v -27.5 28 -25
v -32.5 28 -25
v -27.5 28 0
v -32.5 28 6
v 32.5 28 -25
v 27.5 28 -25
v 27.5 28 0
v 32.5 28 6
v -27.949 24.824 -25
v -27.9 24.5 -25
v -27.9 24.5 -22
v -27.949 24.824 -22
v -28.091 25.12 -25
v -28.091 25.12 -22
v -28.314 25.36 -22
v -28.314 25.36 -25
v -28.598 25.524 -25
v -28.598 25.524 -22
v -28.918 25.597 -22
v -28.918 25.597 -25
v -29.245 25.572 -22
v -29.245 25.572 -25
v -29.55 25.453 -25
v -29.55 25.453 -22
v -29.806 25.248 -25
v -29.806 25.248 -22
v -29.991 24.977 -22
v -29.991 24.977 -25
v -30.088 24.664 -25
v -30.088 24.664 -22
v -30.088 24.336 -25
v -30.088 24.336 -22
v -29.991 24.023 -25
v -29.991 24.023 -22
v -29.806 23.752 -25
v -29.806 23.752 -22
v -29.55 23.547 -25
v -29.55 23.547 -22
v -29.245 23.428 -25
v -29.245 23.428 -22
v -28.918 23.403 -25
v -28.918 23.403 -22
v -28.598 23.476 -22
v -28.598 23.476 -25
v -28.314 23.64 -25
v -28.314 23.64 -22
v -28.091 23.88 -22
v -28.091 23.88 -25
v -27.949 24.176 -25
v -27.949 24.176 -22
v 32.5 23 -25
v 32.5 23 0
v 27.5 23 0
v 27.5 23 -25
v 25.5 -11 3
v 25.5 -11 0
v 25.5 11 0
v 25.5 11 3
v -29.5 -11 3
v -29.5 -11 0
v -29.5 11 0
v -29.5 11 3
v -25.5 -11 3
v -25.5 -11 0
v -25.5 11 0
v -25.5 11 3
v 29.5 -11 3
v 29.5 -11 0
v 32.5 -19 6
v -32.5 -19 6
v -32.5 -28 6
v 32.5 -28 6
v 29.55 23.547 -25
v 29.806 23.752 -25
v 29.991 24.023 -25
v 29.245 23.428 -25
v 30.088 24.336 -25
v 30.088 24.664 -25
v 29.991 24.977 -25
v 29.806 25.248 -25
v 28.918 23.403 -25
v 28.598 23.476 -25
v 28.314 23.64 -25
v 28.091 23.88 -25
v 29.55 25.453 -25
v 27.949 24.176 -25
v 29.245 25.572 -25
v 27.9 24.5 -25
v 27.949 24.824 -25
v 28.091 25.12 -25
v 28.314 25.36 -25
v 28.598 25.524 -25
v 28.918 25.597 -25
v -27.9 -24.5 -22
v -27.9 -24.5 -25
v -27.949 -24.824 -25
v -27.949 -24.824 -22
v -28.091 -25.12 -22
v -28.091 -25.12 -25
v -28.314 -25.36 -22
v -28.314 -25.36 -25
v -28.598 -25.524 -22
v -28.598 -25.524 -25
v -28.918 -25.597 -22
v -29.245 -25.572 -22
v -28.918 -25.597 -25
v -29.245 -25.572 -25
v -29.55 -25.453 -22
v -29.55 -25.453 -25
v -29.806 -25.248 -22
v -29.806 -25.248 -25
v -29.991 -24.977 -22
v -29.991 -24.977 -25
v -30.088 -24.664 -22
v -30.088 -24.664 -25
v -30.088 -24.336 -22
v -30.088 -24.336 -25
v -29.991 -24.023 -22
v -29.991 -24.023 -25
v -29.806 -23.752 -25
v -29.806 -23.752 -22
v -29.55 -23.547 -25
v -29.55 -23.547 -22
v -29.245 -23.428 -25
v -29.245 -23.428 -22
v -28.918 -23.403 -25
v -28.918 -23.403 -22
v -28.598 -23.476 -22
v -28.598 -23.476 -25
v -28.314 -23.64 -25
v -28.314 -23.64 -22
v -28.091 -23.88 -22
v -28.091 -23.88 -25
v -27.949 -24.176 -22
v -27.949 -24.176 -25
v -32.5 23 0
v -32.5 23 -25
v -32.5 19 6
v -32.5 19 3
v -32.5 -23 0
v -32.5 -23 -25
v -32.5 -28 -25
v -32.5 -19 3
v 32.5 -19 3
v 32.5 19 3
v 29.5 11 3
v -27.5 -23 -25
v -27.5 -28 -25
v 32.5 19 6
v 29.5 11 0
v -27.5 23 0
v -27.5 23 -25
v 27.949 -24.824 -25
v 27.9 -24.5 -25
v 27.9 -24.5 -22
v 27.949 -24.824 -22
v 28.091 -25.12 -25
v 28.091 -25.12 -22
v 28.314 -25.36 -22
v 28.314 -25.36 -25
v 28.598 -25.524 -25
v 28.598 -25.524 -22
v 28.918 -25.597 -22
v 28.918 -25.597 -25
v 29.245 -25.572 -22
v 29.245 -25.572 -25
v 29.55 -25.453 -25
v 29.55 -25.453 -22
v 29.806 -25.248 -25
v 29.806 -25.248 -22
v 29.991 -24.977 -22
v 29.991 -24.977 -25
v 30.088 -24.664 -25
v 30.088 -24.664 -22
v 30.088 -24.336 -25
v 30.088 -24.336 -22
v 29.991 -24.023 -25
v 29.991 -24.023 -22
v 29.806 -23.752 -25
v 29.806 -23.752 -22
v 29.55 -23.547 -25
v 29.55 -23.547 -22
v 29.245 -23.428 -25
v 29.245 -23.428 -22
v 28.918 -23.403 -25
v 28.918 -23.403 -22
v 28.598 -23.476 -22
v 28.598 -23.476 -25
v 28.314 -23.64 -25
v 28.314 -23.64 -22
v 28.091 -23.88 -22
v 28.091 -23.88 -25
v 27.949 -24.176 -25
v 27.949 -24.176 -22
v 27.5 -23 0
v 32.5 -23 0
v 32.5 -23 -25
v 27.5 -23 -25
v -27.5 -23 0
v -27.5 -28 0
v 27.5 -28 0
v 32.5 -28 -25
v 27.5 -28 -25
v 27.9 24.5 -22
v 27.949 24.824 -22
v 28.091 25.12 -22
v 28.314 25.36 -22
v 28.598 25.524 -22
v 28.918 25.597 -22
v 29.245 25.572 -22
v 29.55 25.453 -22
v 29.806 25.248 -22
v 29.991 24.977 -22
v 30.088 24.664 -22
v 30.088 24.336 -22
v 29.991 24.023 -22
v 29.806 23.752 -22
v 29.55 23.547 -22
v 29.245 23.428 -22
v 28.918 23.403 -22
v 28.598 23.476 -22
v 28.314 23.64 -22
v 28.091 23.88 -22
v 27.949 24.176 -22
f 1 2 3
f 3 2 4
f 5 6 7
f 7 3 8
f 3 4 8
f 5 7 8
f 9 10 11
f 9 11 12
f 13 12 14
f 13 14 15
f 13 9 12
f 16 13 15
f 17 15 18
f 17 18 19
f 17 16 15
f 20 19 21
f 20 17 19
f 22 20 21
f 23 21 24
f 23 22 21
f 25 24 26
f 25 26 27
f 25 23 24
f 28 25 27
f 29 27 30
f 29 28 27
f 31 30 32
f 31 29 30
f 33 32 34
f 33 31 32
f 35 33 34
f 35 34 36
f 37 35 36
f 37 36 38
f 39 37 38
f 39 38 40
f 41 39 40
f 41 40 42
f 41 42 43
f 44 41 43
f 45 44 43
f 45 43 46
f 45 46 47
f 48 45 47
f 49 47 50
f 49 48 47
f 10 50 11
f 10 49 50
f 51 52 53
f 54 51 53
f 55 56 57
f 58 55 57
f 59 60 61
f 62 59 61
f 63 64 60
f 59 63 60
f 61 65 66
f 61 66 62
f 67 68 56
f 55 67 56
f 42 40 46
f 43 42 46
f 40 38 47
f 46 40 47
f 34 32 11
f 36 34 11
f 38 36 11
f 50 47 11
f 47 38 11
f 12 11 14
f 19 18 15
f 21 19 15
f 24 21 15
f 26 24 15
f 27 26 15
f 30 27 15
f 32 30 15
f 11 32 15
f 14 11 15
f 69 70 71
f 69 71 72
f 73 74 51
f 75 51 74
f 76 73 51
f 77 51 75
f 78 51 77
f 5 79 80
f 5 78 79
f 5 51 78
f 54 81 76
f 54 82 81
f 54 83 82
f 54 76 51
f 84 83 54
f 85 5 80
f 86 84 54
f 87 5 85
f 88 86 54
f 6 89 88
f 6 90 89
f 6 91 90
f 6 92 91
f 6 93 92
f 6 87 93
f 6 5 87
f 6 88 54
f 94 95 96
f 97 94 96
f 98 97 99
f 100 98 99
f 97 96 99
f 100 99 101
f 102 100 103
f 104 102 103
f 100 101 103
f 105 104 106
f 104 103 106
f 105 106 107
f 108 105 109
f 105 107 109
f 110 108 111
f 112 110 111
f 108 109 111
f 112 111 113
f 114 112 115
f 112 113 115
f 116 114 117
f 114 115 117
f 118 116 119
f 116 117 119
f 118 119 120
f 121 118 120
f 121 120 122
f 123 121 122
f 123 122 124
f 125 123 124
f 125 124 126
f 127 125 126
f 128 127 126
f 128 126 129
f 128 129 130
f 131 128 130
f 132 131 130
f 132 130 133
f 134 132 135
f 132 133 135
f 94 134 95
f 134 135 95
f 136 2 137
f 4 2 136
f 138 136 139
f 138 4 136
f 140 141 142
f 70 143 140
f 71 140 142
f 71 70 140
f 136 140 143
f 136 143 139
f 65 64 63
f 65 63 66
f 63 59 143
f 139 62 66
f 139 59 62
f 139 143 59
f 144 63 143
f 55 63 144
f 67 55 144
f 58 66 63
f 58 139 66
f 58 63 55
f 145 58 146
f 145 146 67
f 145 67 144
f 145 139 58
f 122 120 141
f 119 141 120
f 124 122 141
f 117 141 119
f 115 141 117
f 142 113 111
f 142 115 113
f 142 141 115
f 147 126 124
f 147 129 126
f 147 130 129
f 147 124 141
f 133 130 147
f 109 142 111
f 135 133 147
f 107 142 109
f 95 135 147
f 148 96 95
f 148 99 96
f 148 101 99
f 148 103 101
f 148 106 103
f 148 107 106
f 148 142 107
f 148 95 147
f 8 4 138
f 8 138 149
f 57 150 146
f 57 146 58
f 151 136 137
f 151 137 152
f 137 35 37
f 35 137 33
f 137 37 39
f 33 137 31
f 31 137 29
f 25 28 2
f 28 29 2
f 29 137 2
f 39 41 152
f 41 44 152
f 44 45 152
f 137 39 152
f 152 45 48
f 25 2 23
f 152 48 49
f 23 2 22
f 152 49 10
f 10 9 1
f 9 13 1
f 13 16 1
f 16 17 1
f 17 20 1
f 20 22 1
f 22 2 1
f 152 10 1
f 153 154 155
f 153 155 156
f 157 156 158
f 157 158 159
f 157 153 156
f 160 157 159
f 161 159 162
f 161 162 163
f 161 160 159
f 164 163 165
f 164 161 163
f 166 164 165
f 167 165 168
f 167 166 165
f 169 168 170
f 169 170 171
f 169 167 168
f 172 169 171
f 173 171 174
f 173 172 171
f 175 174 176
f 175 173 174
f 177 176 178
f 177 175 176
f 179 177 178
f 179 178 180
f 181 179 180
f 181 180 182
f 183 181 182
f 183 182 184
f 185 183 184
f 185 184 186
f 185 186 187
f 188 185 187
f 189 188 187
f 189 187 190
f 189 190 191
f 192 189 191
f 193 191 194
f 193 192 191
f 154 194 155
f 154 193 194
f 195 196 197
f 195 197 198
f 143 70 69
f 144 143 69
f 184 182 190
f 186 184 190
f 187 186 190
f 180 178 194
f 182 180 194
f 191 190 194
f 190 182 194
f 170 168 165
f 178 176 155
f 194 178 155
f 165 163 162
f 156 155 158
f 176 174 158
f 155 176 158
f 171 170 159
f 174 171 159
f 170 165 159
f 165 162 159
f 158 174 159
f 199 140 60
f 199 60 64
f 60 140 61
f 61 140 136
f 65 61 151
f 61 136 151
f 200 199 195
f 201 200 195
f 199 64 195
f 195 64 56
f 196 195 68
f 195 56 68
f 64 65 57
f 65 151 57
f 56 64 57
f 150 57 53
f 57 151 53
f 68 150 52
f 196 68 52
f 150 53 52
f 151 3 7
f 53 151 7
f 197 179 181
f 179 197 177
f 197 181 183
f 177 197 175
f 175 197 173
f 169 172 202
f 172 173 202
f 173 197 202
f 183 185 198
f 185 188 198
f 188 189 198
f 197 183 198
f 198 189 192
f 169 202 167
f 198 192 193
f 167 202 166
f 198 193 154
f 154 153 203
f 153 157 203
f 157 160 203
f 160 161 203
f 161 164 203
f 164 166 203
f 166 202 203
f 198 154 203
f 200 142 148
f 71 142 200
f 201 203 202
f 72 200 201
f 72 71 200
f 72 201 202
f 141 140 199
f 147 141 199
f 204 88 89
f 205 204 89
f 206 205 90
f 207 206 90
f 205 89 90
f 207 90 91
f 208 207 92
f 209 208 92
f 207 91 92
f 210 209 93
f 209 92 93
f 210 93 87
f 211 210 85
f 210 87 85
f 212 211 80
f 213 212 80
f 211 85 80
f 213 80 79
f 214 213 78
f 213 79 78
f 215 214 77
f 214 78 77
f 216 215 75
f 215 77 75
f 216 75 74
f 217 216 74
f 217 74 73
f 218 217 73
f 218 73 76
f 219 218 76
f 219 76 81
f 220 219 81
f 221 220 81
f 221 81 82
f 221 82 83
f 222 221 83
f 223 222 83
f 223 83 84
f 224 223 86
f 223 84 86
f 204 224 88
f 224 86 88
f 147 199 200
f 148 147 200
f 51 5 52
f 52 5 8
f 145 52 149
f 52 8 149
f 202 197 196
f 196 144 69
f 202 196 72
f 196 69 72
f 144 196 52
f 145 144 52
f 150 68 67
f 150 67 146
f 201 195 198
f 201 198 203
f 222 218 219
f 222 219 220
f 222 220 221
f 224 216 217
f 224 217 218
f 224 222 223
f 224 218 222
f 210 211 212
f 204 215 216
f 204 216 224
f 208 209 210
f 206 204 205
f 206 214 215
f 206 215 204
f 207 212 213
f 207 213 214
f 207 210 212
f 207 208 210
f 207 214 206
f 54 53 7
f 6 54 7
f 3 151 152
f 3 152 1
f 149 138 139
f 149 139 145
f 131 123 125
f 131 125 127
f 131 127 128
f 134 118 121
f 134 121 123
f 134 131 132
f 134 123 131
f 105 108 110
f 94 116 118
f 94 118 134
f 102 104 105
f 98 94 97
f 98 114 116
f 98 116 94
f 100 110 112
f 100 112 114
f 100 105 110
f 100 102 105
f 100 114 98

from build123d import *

# Parameters (mm, degrees)
ESQUISSE1_W                                = 65
ESQUISSE1_H                                = 56
BOSS_EXTRU_1_DEPTH                         = 6
ESQUISSE4_W                                = 65
ESQUISSE4_H                                = 38
ENL_V_MAT_EXTRU_1_DEPTH                    = 3
ESQUISSE5_W                                = 5
ESQUISSE5_H                                = 5
BOSS_EXTRU_2_DEPTH                         = 25
ESQUISSE6_R                                = 1.1
ENL_V_MAT_EXTRU_2_DEPTH                    = 3
ESQUISSE7_W                                = 4
ESQUISSE7_H                                = 22
ENL_V_MAT_EXTRU_3_DEPTH                    = 50.651283971
SYM_TRIE1_AT_THE_SECOND_PLANE_COPY_1_SKE_W = 5
SYM_TRIE1_AT_THE_SECOND_PLANE_COPY_1_SKE_H = 5
SYM_TRIE1_AT_THE_SECOND_PLANE_COPY_1_DEPTH = 25
SYM_TRIE1_AT_THE_SECOND_PLANE_COPY_2_SKE_R = 1.1
SYM_TRIE1_AT_THE_SECOND_PLANE_COPY_2_DEPTH = 3


with BuildPart() as part:
    # Esquisse1 → Boss.-Extru.1 (new body)
    with BuildSketch(Plane.XY):
        Rectangle(ESQUISSE1_W, ESQUISSE1_H)
    extrude(amount=BOSS_EXTRU_1_DEPTH)

    # Esquisse4 → Enlèv. mat.-Extru.1 (cut)
    with BuildSketch(Plane.XY.offset(6)):
        Rectangle(ESQUISSE4_W, ESQUISSE4_H)
    extrude(amount=-ENL_V_MAT_EXTRU_1_DEPTH, mode=Mode.SUBTRACT)

    # Esquisse5 → Boss.-Extru.2 (add)
    with BuildSketch(Plane(origin=(0, 0, 0), x_dir=(-1, 0, 0), z_dir=(0, 0, -1))):
        with Locations((-30, 25.5)):
            Rectangle(ESQUISSE5_W, ESQUISSE5_H)
    boss_extru_2 = extrude(amount=BOSS_EXTRU_2_DEPTH)

    # Esquisse6 → Enlèv. mat.-Extru.2 (cut)
    with BuildSketch(Plane(origin=(0, 0, -25), x_dir=(-1, 0, 0), z_dir=(0, 0, -1))):
        with Locations((-29, 24.5)):
            Circle(ESQUISSE6_R)
    enl_v_mat_extru_2 = extrude(amount=-ENL_V_MAT_EXTRU_2_DEPTH, mode=Mode.SUBTRACT)

    # Esquisse7 → Enlèv. mat.-Extru.3 (cut, through all)
    with BuildSketch(Plane(origin=(0, 0, 0), x_dir=(-1, 0, 0), z_dir=(0, 0, -1))):
        with Locations((-27.5, 0)):
            Rectangle(ESQUISSE7_W, ESQUISSE7_H)
        with Locations((27.5, 0)):
            Rectangle(ESQUISSE7_W, ESQUISSE7_H)
    extrude(amount=-ENL_V_MAT_EXTRU_3_DEPTH, mode=Mode.SUBTRACT)

    # Symétrie1: Boss.-Extru.2, Enlèv. mat.-Extru.2 across plane
    add(boss_extru_2.mirror(Plane.ZX))
    add(enl_v_mat_extru_2.mirror(Plane.ZX), mode=Mode.SUBTRACT)

    # Symétrie1 at the second plane: Boss.-Extru.2, Enlèv. mat.-Extru.2 across plane
    add(boss_extru_2.mirror(Plane(origin=(0, 0, 0), x_dir=(0, 0, 1), z_dir=(1, 0, 0))))
    add(enl_v_mat_extru_2.mirror(Plane(origin=(0, 0, 0), x_dir=(0, 0, 1), z_dir=(1, 0, 0))), mode=Mode.SUBTRACT)

    # Symétrie1 at the second plane copy 1 ske → Symétrie1 at the second plane copy 1 (add)
    with BuildSketch(Plane(origin=(0, 0, 0), x_dir=(1, 0, 0), z_dir=(0, 0, -1))):
        with Locations((-30, 25.5)):
            Rectangle(SYM_TRIE1_AT_THE_SECOND_PLANE_COPY_1_SKE_W, SYM_TRIE1_AT_THE_SECOND_PLANE_COPY_1_SKE_H)
    extrude(amount=SYM_TRIE1_AT_THE_SECOND_PLANE_COPY_1_DEPTH)

    # Symétrie1 at the second plane copy 2 ske → Symétrie1 at the second plane copy 2 (cut)
    with BuildSketch(Plane(origin=(0, 0, -25), x_dir=(1, 0, 0), z_dir=(0, 0, -1))):
        with Locations((-29, 24.5)):
            Circle(SYM_TRIE1_AT_THE_SECOND_PLANE_COPY_2_SKE_R)
    extrude(amount=-SYM_TRIE1_AT_THE_SECOND_PLANE_COPY_2_DEPTH, mode=Mode.SUBTRACT)


solid = part.part
